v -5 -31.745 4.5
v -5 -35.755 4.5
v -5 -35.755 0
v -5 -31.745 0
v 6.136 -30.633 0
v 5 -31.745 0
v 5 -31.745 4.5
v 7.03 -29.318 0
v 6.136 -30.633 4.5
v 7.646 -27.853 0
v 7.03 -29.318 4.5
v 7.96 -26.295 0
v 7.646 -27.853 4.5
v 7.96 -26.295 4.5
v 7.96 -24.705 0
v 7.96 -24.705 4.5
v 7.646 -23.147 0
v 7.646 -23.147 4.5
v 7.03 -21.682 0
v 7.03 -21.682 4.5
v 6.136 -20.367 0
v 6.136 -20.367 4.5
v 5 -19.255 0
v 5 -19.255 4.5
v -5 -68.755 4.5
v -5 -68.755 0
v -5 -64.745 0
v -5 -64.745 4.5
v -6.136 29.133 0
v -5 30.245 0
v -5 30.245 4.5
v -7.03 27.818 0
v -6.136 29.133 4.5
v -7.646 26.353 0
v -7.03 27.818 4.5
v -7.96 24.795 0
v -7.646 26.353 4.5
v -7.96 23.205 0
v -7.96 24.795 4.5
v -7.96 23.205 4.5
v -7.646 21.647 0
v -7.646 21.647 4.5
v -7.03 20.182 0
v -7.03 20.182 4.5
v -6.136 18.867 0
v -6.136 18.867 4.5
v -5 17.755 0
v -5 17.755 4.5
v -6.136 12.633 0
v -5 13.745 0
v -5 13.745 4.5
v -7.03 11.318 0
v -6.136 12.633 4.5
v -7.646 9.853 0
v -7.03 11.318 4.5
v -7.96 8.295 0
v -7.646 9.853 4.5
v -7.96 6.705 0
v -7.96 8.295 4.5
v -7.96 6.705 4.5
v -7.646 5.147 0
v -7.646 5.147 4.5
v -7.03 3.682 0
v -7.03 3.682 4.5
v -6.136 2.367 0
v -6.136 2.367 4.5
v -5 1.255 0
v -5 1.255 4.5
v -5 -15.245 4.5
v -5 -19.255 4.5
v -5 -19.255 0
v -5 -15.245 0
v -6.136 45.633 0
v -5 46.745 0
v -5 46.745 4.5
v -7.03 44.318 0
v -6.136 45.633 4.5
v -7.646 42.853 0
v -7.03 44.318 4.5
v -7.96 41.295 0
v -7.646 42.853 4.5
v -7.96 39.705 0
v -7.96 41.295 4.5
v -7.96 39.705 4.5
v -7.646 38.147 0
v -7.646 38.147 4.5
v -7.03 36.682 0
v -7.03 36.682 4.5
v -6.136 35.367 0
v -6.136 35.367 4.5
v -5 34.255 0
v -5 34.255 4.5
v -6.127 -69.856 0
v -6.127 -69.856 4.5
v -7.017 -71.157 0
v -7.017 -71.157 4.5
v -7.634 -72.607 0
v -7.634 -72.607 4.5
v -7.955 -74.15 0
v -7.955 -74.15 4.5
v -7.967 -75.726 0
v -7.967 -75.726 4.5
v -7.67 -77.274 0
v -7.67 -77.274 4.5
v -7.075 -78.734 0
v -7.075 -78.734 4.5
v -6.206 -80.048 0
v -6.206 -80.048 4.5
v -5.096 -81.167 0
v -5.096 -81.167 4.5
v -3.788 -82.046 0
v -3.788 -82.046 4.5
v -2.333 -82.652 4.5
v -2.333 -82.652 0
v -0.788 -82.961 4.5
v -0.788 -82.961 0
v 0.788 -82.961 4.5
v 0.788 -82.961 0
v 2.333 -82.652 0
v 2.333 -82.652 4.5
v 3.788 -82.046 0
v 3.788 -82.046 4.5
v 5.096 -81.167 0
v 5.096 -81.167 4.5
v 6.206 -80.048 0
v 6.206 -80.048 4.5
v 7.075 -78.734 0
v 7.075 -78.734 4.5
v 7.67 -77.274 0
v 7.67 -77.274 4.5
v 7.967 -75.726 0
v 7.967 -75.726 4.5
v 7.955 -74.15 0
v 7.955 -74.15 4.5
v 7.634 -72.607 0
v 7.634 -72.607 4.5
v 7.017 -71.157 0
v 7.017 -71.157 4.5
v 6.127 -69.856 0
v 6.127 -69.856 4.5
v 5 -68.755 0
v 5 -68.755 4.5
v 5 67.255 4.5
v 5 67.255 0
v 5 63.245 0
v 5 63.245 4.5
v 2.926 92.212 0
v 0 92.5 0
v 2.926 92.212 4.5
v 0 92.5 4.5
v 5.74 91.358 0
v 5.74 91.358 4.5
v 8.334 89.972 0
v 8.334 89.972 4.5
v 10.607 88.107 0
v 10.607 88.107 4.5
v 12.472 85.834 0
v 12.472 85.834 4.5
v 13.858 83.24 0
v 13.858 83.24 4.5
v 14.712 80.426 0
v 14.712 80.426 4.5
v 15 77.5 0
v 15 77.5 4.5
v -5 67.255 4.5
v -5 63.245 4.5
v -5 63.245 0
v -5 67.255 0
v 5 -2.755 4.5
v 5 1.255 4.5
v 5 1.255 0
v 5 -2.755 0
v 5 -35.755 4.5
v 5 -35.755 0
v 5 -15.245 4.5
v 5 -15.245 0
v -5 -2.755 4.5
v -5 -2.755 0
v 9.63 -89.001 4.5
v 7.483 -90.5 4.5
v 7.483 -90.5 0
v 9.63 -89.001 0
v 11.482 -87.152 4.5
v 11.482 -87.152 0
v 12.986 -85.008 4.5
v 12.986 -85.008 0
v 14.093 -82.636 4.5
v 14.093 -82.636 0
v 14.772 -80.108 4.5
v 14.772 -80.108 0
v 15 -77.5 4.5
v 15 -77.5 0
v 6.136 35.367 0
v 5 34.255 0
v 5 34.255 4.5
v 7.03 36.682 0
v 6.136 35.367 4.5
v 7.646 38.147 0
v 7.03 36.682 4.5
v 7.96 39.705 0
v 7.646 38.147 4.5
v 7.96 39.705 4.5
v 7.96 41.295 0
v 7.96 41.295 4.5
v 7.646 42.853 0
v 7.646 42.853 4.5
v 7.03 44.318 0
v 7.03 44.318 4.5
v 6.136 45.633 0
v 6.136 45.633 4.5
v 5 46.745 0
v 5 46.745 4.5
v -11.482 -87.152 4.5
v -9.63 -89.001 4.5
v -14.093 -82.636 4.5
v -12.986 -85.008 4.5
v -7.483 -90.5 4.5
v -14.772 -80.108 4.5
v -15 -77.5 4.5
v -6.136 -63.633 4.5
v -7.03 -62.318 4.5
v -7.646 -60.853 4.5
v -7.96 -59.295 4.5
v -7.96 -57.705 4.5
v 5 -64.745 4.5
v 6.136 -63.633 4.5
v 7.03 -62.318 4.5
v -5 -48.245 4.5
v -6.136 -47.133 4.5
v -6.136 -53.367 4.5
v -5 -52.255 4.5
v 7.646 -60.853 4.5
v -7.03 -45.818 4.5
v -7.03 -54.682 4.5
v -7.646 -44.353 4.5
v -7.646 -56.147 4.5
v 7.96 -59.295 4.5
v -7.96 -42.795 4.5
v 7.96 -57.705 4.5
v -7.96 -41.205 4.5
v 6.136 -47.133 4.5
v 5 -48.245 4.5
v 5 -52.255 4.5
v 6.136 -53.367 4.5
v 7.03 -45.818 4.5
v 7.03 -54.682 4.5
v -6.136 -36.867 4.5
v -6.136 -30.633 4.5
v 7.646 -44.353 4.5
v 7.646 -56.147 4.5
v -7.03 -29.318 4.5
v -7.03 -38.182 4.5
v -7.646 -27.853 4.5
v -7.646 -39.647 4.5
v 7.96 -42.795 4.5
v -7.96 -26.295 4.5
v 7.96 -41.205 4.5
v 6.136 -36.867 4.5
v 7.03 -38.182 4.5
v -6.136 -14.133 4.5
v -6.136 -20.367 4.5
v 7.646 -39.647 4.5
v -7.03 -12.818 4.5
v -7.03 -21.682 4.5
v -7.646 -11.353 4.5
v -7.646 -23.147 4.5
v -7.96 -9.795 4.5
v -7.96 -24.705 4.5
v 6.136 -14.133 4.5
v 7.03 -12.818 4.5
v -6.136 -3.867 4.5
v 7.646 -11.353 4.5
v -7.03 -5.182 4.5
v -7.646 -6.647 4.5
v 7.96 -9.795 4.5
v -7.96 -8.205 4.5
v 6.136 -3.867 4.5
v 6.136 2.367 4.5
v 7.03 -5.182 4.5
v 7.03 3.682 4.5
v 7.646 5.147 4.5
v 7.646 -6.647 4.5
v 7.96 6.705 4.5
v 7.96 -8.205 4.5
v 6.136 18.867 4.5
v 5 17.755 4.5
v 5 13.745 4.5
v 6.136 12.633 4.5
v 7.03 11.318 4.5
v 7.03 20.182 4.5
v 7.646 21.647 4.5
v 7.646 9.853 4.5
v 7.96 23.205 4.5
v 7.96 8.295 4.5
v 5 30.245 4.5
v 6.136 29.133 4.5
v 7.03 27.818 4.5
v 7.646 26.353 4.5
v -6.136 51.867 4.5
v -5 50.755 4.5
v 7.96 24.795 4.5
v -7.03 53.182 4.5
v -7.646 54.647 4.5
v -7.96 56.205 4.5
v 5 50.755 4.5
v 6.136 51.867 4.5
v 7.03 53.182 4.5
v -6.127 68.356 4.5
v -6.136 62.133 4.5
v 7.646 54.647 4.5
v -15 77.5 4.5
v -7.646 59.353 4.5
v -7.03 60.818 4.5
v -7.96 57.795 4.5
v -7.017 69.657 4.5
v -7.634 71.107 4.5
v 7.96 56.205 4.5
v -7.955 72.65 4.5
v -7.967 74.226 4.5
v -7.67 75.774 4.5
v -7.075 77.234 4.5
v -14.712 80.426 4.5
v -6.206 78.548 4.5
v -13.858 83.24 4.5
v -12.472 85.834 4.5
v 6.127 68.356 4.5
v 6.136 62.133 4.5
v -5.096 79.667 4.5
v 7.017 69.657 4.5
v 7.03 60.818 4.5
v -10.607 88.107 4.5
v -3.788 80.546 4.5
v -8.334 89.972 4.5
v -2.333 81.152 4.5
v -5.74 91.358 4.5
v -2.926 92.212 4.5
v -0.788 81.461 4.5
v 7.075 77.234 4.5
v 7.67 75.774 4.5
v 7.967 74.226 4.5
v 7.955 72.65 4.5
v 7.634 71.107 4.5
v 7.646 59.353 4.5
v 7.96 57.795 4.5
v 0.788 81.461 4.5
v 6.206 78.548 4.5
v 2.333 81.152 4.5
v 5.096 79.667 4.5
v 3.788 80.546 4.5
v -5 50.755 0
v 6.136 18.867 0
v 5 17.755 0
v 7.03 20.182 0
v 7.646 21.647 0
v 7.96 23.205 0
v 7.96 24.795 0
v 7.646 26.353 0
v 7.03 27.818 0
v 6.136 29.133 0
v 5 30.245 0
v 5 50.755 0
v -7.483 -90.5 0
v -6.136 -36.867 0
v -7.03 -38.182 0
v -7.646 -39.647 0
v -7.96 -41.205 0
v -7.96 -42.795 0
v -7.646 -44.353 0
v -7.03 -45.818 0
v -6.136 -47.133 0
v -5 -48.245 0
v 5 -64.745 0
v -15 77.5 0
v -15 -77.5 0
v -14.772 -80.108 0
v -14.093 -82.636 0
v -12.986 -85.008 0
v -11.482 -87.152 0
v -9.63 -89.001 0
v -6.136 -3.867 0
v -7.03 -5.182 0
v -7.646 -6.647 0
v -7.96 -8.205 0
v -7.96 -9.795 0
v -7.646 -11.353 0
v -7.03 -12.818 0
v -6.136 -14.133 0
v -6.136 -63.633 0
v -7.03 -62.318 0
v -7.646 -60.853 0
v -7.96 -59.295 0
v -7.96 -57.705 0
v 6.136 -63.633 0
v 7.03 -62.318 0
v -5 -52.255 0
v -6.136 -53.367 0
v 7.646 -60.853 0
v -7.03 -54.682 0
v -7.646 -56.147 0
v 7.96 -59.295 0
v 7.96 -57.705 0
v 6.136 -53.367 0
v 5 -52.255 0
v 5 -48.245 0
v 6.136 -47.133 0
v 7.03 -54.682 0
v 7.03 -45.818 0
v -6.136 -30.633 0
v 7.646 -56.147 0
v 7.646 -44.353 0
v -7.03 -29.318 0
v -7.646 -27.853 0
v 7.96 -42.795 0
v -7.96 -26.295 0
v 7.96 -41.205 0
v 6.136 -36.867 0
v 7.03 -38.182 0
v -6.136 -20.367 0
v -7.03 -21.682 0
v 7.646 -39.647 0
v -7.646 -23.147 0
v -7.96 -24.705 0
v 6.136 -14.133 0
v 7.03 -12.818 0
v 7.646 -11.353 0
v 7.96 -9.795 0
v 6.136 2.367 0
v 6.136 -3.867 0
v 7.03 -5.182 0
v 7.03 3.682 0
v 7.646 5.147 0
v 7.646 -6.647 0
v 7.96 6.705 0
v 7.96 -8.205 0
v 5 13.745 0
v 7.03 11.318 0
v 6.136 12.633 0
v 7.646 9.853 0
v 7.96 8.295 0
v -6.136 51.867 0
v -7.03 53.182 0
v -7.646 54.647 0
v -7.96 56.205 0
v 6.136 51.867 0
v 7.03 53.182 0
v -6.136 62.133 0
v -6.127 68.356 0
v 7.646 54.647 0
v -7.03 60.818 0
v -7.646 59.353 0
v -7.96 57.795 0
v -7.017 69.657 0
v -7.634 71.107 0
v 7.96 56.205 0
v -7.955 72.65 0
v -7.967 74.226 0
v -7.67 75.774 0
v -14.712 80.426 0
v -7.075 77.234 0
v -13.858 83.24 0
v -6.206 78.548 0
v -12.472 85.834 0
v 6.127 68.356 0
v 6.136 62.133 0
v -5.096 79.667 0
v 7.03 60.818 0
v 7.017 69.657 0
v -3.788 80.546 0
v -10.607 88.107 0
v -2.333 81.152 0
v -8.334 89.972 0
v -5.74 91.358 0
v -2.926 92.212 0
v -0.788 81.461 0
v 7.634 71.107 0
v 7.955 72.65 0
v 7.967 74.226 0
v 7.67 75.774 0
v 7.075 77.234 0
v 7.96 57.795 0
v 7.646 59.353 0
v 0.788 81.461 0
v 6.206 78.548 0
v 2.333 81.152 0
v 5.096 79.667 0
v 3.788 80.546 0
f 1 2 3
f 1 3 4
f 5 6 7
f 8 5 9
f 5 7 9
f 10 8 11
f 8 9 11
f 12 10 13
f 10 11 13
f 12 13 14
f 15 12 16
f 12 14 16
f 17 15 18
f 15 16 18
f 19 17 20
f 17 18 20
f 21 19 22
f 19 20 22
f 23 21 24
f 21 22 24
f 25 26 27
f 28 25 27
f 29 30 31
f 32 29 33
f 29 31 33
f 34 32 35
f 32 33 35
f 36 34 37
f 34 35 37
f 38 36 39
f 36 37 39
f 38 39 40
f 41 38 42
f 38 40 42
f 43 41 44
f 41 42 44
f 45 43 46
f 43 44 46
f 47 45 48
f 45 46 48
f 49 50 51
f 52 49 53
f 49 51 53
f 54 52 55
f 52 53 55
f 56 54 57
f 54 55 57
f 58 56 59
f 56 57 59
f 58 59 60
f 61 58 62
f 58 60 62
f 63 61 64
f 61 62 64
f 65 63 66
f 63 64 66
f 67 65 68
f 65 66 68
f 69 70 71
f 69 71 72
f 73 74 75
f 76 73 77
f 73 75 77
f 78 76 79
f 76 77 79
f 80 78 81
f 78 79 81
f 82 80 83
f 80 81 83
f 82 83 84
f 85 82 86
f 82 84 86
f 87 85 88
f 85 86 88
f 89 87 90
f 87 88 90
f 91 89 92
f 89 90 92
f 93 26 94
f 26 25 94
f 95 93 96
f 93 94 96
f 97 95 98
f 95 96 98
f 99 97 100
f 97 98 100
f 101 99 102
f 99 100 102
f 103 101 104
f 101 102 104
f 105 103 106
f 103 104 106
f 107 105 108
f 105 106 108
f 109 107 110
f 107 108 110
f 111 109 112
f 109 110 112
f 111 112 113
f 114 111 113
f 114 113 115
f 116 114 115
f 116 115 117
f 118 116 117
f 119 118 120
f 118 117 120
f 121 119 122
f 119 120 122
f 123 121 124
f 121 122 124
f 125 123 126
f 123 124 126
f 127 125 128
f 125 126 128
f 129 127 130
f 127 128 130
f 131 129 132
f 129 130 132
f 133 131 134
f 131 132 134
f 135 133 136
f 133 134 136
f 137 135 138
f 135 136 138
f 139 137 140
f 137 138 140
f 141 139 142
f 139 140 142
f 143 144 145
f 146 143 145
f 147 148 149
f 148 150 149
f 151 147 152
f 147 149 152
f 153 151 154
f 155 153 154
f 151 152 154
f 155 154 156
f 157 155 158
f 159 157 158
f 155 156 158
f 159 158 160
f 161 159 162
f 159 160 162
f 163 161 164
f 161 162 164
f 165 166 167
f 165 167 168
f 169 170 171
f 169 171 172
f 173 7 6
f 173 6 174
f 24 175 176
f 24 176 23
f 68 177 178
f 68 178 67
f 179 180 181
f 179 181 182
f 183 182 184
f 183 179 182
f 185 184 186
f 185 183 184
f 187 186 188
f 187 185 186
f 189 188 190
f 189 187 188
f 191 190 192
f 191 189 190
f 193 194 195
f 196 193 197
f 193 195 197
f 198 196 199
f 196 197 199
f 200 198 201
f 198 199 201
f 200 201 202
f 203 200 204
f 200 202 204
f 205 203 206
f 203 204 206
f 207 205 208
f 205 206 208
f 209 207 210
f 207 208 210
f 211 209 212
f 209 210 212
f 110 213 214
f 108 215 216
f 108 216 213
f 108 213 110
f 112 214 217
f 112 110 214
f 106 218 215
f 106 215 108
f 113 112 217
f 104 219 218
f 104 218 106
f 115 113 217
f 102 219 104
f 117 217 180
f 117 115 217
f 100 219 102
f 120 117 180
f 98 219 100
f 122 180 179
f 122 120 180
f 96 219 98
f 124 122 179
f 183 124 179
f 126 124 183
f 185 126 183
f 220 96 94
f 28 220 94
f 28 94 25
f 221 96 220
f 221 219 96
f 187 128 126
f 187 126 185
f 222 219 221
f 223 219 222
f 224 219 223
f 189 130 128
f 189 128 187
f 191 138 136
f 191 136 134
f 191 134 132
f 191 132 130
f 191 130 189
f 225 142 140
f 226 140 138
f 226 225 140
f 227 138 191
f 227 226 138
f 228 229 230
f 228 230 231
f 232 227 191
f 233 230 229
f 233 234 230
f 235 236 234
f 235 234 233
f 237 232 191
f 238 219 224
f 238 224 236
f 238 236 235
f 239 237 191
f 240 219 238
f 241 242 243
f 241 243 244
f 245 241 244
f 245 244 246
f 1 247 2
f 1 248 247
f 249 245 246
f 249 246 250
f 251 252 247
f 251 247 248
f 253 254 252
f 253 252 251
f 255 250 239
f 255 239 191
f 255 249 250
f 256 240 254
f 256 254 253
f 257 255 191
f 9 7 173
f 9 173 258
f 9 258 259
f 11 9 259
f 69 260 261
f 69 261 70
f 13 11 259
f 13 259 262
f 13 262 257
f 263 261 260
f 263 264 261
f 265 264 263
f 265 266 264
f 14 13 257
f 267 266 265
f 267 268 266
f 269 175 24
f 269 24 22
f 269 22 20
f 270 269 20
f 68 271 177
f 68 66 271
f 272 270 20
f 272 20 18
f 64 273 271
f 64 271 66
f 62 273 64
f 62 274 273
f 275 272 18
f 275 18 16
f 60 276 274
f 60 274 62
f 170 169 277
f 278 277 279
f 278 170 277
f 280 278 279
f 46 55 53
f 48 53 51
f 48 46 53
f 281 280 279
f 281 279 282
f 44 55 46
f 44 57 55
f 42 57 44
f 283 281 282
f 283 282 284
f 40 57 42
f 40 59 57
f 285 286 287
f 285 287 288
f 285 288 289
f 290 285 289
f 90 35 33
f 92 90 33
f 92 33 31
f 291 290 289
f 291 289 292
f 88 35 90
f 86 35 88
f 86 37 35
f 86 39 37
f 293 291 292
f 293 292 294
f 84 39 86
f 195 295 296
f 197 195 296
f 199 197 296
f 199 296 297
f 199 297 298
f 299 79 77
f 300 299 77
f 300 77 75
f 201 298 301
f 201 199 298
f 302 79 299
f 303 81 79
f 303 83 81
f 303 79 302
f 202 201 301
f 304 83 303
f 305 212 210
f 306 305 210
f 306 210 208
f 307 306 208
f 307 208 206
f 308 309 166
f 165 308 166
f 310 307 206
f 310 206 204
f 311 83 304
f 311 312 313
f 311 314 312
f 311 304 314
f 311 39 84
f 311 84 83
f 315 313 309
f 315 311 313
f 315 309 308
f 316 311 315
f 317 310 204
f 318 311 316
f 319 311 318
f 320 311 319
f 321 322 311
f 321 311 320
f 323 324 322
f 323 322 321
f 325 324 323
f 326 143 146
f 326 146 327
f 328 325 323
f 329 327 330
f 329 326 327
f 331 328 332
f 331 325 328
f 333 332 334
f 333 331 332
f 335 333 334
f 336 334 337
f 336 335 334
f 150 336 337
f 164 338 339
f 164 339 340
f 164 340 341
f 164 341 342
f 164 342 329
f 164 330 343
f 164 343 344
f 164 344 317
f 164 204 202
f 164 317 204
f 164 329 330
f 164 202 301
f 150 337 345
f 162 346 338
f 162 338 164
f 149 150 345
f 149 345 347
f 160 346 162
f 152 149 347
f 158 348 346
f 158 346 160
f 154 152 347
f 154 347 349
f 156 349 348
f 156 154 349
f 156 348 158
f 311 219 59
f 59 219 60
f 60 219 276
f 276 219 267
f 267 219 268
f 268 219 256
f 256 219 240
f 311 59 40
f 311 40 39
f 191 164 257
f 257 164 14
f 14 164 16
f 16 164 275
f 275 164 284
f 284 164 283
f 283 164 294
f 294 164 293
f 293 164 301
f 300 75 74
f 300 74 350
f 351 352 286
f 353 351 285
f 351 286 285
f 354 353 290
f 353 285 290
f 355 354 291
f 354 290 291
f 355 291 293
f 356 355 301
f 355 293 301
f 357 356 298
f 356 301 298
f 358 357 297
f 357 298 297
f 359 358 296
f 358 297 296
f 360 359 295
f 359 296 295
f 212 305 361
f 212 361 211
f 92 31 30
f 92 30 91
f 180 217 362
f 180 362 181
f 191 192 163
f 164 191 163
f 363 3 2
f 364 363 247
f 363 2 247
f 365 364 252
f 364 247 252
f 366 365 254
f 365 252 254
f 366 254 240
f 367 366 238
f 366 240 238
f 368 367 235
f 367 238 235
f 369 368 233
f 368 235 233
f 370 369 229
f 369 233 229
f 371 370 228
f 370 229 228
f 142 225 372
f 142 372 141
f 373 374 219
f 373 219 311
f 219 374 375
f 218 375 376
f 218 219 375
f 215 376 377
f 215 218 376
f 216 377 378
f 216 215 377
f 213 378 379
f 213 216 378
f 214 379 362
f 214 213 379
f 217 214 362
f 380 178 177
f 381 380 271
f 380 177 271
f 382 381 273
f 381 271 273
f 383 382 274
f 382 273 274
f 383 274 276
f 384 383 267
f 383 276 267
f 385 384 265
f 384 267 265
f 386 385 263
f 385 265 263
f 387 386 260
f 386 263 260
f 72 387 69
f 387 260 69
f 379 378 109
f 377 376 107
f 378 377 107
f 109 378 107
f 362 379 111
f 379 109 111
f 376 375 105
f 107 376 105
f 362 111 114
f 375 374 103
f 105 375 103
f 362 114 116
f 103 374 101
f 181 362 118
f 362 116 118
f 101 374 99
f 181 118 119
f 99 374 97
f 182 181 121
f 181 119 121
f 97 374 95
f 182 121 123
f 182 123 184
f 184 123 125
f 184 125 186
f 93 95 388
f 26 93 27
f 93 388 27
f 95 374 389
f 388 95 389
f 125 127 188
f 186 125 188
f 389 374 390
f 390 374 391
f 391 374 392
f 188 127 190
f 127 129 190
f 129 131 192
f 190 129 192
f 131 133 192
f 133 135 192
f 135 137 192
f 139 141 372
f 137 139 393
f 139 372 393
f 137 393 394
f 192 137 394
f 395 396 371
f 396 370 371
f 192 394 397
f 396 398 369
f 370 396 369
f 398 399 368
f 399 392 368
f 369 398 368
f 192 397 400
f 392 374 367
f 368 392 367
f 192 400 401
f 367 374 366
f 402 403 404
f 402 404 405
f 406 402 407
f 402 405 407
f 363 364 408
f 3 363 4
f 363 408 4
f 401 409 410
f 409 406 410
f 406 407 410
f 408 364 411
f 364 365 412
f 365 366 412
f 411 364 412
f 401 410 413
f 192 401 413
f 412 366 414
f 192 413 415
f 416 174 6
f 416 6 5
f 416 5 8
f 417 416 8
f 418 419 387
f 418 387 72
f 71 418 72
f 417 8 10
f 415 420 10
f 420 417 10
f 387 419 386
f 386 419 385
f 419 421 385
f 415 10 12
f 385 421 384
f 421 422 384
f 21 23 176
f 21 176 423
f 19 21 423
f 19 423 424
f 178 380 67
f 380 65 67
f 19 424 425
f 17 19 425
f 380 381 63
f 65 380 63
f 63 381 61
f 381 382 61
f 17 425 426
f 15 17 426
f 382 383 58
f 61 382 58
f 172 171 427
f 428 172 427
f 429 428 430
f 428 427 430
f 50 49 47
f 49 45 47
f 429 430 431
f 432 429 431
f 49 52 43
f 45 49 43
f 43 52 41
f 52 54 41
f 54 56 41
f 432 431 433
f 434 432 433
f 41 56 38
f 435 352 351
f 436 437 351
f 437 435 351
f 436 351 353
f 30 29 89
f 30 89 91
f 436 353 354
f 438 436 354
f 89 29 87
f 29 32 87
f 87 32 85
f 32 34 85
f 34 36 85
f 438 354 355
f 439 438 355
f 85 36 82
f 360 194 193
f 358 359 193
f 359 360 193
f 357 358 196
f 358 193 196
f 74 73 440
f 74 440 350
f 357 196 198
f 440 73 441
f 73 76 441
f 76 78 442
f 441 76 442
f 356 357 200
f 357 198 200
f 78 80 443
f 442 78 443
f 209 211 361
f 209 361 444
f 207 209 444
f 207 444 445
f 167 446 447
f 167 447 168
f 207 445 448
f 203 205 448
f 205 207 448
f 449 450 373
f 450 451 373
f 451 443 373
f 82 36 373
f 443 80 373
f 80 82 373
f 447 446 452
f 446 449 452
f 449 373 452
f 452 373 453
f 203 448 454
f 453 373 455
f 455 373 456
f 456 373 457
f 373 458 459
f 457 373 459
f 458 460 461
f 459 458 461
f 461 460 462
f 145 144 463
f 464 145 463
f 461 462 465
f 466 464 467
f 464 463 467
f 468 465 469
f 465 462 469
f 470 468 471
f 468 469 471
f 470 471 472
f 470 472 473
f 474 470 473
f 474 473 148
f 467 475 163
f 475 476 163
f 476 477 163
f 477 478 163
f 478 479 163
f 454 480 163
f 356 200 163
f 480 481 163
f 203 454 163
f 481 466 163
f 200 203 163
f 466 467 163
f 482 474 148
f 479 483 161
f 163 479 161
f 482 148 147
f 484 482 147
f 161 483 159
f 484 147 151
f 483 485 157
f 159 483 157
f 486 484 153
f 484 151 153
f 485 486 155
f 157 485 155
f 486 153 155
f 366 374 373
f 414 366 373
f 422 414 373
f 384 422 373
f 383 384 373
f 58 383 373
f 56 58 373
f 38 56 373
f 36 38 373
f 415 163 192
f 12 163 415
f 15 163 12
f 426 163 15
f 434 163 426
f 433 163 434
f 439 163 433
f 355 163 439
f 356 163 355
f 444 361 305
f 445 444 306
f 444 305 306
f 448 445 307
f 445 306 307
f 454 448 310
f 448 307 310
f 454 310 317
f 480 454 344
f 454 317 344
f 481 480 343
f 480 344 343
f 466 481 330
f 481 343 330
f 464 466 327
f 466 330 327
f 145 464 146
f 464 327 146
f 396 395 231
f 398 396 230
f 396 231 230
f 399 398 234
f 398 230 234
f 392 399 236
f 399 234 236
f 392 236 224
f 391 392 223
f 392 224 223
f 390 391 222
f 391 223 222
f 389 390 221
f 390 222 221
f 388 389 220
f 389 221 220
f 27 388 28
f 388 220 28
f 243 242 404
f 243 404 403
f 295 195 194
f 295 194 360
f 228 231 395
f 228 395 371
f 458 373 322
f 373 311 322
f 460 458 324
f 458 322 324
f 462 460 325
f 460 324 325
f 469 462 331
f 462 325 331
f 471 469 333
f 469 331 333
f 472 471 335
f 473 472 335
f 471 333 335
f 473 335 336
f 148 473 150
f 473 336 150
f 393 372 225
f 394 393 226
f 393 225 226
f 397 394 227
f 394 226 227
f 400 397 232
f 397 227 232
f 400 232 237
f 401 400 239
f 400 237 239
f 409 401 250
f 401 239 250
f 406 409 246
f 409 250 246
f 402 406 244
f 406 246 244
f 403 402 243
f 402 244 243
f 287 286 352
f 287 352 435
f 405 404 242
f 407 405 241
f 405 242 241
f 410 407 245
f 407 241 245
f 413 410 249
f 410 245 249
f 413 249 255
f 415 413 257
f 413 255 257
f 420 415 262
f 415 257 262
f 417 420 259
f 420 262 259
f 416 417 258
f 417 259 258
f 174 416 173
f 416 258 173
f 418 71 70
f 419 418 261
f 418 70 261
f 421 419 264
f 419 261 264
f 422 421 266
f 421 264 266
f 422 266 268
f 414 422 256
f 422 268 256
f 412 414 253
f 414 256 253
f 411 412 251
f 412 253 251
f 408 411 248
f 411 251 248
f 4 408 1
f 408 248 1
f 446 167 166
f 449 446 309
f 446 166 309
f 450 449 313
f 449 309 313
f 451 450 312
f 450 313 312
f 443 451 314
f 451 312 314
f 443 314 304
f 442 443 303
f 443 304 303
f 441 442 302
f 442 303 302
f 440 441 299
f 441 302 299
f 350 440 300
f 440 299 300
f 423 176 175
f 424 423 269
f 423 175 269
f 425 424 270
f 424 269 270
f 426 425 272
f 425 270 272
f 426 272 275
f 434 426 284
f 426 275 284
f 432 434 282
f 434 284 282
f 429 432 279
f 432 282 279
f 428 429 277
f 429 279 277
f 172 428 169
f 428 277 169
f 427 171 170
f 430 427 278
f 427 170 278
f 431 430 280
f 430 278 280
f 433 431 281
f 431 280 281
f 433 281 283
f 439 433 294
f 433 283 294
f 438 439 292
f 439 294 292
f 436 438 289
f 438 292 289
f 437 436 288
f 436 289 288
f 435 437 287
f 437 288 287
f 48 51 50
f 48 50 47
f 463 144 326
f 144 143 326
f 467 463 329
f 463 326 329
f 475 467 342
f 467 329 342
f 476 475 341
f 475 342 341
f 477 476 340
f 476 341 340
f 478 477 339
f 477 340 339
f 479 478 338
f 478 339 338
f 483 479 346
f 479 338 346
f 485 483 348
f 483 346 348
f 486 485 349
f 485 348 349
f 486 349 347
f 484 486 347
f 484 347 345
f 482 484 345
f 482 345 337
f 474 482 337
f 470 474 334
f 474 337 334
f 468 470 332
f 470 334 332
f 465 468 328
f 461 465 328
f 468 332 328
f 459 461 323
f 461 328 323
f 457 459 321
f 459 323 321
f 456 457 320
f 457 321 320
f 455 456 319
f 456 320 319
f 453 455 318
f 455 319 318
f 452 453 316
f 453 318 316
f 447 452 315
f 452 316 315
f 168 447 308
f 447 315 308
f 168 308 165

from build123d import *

# Parameters (mm, degrees)
CROQUIS1_W              = 30
CROQUIS1_H              = 185
SALIENTE_EXTRUIR1_DEPTH = 4.5
REDONDEO1_R             = 15
CROQUIS2_R              = 8
CORTAR_EXTRUIR1_DEPTH   = 10
CROQUIS3_W              = 36.075387002
CROQUIS3_H              = 11.559576231
CORTAR_EXTRUIR2_DEPTH   = 10


with BuildPart() as part:
    # Croquis1 → Saliente-Extruir1 (new body)
    with BuildSketch(Plane.XY):
        Rectangle(CROQUIS1_W, CROQUIS1_H)
        with BuildLine():
            Line((5, 72.5), (5, -72.5))
            ThreePointArc((5, -72.5), (0, -77.5), (-5, -72.5))
            Line((-5, -72.5), (-5, 72.5))
            ThreePointArc((-5, 72.5), (0, 77.5), (5, 72.5))
        make_face(mode=Mode.SUBTRACT)
    extrude(amount=SALIENTE_EXTRUIR1_DEPTH)

    # Redondeo1
    redondeo1_edges = [part.edges().sort_by_distance(p)[0] for p in [
        (15, -92.5, 2.25),
        (-15, -92.5, 2.25),
        (-15, 92.5, 2.25),
        (15, 92.5, 2.25),
    ]]
    fillet(redondeo1_edges, radius=REDONDEO1_R - 0.0001)  # a hair under: the kernel refuses the full size

    # Croquis2 → Cortar-Extruir1 (cut)
    with BuildSketch(Plane.XY.offset(4.5)):
        with Locations((0, 73.5)):
            Circle(CROQUIS2_R)
        with Locations((0, 57)):
            Circle(CROQUIS2_R)
        with Locations((0, 40.5)):
            Circle(CROQUIS2_R)
        with Locations((0, 24)):
            Circle(CROQUIS2_R)
        with Locations((0, 7.5)):
            Circle(CROQUIS2_R)
        with Locations((0, -9)):
            Circle(CROQUIS2_R)
        with Locations((0, -25.5)):
            Circle(CROQUIS2_R)
        with Locations((0, -42)):
            Circle(CROQUIS2_R)
        with Locations((0, -58.5)):
            Circle(CROQUIS2_R)
        with Locations((0, -75)):
            Circle(CROQUIS2_R)
    extrude(amount=-CORTAR_EXTRUIR1_DEPTH, mode=Mode.SUBTRACT)

    # Croquis3 → Cortar-Extruir2 (cut)
    with BuildSketch(Plane.XY.offset(4.5)):
        with Locations((0.166198184, -96.279788115)):
            Rectangle(CROQUIS3_W, CROQUIS3_H)
    extrude(amount=-CORTAR_EXTRUIR2_DEPTH, mode=Mode.SUBTRACT)


solid = part.part
